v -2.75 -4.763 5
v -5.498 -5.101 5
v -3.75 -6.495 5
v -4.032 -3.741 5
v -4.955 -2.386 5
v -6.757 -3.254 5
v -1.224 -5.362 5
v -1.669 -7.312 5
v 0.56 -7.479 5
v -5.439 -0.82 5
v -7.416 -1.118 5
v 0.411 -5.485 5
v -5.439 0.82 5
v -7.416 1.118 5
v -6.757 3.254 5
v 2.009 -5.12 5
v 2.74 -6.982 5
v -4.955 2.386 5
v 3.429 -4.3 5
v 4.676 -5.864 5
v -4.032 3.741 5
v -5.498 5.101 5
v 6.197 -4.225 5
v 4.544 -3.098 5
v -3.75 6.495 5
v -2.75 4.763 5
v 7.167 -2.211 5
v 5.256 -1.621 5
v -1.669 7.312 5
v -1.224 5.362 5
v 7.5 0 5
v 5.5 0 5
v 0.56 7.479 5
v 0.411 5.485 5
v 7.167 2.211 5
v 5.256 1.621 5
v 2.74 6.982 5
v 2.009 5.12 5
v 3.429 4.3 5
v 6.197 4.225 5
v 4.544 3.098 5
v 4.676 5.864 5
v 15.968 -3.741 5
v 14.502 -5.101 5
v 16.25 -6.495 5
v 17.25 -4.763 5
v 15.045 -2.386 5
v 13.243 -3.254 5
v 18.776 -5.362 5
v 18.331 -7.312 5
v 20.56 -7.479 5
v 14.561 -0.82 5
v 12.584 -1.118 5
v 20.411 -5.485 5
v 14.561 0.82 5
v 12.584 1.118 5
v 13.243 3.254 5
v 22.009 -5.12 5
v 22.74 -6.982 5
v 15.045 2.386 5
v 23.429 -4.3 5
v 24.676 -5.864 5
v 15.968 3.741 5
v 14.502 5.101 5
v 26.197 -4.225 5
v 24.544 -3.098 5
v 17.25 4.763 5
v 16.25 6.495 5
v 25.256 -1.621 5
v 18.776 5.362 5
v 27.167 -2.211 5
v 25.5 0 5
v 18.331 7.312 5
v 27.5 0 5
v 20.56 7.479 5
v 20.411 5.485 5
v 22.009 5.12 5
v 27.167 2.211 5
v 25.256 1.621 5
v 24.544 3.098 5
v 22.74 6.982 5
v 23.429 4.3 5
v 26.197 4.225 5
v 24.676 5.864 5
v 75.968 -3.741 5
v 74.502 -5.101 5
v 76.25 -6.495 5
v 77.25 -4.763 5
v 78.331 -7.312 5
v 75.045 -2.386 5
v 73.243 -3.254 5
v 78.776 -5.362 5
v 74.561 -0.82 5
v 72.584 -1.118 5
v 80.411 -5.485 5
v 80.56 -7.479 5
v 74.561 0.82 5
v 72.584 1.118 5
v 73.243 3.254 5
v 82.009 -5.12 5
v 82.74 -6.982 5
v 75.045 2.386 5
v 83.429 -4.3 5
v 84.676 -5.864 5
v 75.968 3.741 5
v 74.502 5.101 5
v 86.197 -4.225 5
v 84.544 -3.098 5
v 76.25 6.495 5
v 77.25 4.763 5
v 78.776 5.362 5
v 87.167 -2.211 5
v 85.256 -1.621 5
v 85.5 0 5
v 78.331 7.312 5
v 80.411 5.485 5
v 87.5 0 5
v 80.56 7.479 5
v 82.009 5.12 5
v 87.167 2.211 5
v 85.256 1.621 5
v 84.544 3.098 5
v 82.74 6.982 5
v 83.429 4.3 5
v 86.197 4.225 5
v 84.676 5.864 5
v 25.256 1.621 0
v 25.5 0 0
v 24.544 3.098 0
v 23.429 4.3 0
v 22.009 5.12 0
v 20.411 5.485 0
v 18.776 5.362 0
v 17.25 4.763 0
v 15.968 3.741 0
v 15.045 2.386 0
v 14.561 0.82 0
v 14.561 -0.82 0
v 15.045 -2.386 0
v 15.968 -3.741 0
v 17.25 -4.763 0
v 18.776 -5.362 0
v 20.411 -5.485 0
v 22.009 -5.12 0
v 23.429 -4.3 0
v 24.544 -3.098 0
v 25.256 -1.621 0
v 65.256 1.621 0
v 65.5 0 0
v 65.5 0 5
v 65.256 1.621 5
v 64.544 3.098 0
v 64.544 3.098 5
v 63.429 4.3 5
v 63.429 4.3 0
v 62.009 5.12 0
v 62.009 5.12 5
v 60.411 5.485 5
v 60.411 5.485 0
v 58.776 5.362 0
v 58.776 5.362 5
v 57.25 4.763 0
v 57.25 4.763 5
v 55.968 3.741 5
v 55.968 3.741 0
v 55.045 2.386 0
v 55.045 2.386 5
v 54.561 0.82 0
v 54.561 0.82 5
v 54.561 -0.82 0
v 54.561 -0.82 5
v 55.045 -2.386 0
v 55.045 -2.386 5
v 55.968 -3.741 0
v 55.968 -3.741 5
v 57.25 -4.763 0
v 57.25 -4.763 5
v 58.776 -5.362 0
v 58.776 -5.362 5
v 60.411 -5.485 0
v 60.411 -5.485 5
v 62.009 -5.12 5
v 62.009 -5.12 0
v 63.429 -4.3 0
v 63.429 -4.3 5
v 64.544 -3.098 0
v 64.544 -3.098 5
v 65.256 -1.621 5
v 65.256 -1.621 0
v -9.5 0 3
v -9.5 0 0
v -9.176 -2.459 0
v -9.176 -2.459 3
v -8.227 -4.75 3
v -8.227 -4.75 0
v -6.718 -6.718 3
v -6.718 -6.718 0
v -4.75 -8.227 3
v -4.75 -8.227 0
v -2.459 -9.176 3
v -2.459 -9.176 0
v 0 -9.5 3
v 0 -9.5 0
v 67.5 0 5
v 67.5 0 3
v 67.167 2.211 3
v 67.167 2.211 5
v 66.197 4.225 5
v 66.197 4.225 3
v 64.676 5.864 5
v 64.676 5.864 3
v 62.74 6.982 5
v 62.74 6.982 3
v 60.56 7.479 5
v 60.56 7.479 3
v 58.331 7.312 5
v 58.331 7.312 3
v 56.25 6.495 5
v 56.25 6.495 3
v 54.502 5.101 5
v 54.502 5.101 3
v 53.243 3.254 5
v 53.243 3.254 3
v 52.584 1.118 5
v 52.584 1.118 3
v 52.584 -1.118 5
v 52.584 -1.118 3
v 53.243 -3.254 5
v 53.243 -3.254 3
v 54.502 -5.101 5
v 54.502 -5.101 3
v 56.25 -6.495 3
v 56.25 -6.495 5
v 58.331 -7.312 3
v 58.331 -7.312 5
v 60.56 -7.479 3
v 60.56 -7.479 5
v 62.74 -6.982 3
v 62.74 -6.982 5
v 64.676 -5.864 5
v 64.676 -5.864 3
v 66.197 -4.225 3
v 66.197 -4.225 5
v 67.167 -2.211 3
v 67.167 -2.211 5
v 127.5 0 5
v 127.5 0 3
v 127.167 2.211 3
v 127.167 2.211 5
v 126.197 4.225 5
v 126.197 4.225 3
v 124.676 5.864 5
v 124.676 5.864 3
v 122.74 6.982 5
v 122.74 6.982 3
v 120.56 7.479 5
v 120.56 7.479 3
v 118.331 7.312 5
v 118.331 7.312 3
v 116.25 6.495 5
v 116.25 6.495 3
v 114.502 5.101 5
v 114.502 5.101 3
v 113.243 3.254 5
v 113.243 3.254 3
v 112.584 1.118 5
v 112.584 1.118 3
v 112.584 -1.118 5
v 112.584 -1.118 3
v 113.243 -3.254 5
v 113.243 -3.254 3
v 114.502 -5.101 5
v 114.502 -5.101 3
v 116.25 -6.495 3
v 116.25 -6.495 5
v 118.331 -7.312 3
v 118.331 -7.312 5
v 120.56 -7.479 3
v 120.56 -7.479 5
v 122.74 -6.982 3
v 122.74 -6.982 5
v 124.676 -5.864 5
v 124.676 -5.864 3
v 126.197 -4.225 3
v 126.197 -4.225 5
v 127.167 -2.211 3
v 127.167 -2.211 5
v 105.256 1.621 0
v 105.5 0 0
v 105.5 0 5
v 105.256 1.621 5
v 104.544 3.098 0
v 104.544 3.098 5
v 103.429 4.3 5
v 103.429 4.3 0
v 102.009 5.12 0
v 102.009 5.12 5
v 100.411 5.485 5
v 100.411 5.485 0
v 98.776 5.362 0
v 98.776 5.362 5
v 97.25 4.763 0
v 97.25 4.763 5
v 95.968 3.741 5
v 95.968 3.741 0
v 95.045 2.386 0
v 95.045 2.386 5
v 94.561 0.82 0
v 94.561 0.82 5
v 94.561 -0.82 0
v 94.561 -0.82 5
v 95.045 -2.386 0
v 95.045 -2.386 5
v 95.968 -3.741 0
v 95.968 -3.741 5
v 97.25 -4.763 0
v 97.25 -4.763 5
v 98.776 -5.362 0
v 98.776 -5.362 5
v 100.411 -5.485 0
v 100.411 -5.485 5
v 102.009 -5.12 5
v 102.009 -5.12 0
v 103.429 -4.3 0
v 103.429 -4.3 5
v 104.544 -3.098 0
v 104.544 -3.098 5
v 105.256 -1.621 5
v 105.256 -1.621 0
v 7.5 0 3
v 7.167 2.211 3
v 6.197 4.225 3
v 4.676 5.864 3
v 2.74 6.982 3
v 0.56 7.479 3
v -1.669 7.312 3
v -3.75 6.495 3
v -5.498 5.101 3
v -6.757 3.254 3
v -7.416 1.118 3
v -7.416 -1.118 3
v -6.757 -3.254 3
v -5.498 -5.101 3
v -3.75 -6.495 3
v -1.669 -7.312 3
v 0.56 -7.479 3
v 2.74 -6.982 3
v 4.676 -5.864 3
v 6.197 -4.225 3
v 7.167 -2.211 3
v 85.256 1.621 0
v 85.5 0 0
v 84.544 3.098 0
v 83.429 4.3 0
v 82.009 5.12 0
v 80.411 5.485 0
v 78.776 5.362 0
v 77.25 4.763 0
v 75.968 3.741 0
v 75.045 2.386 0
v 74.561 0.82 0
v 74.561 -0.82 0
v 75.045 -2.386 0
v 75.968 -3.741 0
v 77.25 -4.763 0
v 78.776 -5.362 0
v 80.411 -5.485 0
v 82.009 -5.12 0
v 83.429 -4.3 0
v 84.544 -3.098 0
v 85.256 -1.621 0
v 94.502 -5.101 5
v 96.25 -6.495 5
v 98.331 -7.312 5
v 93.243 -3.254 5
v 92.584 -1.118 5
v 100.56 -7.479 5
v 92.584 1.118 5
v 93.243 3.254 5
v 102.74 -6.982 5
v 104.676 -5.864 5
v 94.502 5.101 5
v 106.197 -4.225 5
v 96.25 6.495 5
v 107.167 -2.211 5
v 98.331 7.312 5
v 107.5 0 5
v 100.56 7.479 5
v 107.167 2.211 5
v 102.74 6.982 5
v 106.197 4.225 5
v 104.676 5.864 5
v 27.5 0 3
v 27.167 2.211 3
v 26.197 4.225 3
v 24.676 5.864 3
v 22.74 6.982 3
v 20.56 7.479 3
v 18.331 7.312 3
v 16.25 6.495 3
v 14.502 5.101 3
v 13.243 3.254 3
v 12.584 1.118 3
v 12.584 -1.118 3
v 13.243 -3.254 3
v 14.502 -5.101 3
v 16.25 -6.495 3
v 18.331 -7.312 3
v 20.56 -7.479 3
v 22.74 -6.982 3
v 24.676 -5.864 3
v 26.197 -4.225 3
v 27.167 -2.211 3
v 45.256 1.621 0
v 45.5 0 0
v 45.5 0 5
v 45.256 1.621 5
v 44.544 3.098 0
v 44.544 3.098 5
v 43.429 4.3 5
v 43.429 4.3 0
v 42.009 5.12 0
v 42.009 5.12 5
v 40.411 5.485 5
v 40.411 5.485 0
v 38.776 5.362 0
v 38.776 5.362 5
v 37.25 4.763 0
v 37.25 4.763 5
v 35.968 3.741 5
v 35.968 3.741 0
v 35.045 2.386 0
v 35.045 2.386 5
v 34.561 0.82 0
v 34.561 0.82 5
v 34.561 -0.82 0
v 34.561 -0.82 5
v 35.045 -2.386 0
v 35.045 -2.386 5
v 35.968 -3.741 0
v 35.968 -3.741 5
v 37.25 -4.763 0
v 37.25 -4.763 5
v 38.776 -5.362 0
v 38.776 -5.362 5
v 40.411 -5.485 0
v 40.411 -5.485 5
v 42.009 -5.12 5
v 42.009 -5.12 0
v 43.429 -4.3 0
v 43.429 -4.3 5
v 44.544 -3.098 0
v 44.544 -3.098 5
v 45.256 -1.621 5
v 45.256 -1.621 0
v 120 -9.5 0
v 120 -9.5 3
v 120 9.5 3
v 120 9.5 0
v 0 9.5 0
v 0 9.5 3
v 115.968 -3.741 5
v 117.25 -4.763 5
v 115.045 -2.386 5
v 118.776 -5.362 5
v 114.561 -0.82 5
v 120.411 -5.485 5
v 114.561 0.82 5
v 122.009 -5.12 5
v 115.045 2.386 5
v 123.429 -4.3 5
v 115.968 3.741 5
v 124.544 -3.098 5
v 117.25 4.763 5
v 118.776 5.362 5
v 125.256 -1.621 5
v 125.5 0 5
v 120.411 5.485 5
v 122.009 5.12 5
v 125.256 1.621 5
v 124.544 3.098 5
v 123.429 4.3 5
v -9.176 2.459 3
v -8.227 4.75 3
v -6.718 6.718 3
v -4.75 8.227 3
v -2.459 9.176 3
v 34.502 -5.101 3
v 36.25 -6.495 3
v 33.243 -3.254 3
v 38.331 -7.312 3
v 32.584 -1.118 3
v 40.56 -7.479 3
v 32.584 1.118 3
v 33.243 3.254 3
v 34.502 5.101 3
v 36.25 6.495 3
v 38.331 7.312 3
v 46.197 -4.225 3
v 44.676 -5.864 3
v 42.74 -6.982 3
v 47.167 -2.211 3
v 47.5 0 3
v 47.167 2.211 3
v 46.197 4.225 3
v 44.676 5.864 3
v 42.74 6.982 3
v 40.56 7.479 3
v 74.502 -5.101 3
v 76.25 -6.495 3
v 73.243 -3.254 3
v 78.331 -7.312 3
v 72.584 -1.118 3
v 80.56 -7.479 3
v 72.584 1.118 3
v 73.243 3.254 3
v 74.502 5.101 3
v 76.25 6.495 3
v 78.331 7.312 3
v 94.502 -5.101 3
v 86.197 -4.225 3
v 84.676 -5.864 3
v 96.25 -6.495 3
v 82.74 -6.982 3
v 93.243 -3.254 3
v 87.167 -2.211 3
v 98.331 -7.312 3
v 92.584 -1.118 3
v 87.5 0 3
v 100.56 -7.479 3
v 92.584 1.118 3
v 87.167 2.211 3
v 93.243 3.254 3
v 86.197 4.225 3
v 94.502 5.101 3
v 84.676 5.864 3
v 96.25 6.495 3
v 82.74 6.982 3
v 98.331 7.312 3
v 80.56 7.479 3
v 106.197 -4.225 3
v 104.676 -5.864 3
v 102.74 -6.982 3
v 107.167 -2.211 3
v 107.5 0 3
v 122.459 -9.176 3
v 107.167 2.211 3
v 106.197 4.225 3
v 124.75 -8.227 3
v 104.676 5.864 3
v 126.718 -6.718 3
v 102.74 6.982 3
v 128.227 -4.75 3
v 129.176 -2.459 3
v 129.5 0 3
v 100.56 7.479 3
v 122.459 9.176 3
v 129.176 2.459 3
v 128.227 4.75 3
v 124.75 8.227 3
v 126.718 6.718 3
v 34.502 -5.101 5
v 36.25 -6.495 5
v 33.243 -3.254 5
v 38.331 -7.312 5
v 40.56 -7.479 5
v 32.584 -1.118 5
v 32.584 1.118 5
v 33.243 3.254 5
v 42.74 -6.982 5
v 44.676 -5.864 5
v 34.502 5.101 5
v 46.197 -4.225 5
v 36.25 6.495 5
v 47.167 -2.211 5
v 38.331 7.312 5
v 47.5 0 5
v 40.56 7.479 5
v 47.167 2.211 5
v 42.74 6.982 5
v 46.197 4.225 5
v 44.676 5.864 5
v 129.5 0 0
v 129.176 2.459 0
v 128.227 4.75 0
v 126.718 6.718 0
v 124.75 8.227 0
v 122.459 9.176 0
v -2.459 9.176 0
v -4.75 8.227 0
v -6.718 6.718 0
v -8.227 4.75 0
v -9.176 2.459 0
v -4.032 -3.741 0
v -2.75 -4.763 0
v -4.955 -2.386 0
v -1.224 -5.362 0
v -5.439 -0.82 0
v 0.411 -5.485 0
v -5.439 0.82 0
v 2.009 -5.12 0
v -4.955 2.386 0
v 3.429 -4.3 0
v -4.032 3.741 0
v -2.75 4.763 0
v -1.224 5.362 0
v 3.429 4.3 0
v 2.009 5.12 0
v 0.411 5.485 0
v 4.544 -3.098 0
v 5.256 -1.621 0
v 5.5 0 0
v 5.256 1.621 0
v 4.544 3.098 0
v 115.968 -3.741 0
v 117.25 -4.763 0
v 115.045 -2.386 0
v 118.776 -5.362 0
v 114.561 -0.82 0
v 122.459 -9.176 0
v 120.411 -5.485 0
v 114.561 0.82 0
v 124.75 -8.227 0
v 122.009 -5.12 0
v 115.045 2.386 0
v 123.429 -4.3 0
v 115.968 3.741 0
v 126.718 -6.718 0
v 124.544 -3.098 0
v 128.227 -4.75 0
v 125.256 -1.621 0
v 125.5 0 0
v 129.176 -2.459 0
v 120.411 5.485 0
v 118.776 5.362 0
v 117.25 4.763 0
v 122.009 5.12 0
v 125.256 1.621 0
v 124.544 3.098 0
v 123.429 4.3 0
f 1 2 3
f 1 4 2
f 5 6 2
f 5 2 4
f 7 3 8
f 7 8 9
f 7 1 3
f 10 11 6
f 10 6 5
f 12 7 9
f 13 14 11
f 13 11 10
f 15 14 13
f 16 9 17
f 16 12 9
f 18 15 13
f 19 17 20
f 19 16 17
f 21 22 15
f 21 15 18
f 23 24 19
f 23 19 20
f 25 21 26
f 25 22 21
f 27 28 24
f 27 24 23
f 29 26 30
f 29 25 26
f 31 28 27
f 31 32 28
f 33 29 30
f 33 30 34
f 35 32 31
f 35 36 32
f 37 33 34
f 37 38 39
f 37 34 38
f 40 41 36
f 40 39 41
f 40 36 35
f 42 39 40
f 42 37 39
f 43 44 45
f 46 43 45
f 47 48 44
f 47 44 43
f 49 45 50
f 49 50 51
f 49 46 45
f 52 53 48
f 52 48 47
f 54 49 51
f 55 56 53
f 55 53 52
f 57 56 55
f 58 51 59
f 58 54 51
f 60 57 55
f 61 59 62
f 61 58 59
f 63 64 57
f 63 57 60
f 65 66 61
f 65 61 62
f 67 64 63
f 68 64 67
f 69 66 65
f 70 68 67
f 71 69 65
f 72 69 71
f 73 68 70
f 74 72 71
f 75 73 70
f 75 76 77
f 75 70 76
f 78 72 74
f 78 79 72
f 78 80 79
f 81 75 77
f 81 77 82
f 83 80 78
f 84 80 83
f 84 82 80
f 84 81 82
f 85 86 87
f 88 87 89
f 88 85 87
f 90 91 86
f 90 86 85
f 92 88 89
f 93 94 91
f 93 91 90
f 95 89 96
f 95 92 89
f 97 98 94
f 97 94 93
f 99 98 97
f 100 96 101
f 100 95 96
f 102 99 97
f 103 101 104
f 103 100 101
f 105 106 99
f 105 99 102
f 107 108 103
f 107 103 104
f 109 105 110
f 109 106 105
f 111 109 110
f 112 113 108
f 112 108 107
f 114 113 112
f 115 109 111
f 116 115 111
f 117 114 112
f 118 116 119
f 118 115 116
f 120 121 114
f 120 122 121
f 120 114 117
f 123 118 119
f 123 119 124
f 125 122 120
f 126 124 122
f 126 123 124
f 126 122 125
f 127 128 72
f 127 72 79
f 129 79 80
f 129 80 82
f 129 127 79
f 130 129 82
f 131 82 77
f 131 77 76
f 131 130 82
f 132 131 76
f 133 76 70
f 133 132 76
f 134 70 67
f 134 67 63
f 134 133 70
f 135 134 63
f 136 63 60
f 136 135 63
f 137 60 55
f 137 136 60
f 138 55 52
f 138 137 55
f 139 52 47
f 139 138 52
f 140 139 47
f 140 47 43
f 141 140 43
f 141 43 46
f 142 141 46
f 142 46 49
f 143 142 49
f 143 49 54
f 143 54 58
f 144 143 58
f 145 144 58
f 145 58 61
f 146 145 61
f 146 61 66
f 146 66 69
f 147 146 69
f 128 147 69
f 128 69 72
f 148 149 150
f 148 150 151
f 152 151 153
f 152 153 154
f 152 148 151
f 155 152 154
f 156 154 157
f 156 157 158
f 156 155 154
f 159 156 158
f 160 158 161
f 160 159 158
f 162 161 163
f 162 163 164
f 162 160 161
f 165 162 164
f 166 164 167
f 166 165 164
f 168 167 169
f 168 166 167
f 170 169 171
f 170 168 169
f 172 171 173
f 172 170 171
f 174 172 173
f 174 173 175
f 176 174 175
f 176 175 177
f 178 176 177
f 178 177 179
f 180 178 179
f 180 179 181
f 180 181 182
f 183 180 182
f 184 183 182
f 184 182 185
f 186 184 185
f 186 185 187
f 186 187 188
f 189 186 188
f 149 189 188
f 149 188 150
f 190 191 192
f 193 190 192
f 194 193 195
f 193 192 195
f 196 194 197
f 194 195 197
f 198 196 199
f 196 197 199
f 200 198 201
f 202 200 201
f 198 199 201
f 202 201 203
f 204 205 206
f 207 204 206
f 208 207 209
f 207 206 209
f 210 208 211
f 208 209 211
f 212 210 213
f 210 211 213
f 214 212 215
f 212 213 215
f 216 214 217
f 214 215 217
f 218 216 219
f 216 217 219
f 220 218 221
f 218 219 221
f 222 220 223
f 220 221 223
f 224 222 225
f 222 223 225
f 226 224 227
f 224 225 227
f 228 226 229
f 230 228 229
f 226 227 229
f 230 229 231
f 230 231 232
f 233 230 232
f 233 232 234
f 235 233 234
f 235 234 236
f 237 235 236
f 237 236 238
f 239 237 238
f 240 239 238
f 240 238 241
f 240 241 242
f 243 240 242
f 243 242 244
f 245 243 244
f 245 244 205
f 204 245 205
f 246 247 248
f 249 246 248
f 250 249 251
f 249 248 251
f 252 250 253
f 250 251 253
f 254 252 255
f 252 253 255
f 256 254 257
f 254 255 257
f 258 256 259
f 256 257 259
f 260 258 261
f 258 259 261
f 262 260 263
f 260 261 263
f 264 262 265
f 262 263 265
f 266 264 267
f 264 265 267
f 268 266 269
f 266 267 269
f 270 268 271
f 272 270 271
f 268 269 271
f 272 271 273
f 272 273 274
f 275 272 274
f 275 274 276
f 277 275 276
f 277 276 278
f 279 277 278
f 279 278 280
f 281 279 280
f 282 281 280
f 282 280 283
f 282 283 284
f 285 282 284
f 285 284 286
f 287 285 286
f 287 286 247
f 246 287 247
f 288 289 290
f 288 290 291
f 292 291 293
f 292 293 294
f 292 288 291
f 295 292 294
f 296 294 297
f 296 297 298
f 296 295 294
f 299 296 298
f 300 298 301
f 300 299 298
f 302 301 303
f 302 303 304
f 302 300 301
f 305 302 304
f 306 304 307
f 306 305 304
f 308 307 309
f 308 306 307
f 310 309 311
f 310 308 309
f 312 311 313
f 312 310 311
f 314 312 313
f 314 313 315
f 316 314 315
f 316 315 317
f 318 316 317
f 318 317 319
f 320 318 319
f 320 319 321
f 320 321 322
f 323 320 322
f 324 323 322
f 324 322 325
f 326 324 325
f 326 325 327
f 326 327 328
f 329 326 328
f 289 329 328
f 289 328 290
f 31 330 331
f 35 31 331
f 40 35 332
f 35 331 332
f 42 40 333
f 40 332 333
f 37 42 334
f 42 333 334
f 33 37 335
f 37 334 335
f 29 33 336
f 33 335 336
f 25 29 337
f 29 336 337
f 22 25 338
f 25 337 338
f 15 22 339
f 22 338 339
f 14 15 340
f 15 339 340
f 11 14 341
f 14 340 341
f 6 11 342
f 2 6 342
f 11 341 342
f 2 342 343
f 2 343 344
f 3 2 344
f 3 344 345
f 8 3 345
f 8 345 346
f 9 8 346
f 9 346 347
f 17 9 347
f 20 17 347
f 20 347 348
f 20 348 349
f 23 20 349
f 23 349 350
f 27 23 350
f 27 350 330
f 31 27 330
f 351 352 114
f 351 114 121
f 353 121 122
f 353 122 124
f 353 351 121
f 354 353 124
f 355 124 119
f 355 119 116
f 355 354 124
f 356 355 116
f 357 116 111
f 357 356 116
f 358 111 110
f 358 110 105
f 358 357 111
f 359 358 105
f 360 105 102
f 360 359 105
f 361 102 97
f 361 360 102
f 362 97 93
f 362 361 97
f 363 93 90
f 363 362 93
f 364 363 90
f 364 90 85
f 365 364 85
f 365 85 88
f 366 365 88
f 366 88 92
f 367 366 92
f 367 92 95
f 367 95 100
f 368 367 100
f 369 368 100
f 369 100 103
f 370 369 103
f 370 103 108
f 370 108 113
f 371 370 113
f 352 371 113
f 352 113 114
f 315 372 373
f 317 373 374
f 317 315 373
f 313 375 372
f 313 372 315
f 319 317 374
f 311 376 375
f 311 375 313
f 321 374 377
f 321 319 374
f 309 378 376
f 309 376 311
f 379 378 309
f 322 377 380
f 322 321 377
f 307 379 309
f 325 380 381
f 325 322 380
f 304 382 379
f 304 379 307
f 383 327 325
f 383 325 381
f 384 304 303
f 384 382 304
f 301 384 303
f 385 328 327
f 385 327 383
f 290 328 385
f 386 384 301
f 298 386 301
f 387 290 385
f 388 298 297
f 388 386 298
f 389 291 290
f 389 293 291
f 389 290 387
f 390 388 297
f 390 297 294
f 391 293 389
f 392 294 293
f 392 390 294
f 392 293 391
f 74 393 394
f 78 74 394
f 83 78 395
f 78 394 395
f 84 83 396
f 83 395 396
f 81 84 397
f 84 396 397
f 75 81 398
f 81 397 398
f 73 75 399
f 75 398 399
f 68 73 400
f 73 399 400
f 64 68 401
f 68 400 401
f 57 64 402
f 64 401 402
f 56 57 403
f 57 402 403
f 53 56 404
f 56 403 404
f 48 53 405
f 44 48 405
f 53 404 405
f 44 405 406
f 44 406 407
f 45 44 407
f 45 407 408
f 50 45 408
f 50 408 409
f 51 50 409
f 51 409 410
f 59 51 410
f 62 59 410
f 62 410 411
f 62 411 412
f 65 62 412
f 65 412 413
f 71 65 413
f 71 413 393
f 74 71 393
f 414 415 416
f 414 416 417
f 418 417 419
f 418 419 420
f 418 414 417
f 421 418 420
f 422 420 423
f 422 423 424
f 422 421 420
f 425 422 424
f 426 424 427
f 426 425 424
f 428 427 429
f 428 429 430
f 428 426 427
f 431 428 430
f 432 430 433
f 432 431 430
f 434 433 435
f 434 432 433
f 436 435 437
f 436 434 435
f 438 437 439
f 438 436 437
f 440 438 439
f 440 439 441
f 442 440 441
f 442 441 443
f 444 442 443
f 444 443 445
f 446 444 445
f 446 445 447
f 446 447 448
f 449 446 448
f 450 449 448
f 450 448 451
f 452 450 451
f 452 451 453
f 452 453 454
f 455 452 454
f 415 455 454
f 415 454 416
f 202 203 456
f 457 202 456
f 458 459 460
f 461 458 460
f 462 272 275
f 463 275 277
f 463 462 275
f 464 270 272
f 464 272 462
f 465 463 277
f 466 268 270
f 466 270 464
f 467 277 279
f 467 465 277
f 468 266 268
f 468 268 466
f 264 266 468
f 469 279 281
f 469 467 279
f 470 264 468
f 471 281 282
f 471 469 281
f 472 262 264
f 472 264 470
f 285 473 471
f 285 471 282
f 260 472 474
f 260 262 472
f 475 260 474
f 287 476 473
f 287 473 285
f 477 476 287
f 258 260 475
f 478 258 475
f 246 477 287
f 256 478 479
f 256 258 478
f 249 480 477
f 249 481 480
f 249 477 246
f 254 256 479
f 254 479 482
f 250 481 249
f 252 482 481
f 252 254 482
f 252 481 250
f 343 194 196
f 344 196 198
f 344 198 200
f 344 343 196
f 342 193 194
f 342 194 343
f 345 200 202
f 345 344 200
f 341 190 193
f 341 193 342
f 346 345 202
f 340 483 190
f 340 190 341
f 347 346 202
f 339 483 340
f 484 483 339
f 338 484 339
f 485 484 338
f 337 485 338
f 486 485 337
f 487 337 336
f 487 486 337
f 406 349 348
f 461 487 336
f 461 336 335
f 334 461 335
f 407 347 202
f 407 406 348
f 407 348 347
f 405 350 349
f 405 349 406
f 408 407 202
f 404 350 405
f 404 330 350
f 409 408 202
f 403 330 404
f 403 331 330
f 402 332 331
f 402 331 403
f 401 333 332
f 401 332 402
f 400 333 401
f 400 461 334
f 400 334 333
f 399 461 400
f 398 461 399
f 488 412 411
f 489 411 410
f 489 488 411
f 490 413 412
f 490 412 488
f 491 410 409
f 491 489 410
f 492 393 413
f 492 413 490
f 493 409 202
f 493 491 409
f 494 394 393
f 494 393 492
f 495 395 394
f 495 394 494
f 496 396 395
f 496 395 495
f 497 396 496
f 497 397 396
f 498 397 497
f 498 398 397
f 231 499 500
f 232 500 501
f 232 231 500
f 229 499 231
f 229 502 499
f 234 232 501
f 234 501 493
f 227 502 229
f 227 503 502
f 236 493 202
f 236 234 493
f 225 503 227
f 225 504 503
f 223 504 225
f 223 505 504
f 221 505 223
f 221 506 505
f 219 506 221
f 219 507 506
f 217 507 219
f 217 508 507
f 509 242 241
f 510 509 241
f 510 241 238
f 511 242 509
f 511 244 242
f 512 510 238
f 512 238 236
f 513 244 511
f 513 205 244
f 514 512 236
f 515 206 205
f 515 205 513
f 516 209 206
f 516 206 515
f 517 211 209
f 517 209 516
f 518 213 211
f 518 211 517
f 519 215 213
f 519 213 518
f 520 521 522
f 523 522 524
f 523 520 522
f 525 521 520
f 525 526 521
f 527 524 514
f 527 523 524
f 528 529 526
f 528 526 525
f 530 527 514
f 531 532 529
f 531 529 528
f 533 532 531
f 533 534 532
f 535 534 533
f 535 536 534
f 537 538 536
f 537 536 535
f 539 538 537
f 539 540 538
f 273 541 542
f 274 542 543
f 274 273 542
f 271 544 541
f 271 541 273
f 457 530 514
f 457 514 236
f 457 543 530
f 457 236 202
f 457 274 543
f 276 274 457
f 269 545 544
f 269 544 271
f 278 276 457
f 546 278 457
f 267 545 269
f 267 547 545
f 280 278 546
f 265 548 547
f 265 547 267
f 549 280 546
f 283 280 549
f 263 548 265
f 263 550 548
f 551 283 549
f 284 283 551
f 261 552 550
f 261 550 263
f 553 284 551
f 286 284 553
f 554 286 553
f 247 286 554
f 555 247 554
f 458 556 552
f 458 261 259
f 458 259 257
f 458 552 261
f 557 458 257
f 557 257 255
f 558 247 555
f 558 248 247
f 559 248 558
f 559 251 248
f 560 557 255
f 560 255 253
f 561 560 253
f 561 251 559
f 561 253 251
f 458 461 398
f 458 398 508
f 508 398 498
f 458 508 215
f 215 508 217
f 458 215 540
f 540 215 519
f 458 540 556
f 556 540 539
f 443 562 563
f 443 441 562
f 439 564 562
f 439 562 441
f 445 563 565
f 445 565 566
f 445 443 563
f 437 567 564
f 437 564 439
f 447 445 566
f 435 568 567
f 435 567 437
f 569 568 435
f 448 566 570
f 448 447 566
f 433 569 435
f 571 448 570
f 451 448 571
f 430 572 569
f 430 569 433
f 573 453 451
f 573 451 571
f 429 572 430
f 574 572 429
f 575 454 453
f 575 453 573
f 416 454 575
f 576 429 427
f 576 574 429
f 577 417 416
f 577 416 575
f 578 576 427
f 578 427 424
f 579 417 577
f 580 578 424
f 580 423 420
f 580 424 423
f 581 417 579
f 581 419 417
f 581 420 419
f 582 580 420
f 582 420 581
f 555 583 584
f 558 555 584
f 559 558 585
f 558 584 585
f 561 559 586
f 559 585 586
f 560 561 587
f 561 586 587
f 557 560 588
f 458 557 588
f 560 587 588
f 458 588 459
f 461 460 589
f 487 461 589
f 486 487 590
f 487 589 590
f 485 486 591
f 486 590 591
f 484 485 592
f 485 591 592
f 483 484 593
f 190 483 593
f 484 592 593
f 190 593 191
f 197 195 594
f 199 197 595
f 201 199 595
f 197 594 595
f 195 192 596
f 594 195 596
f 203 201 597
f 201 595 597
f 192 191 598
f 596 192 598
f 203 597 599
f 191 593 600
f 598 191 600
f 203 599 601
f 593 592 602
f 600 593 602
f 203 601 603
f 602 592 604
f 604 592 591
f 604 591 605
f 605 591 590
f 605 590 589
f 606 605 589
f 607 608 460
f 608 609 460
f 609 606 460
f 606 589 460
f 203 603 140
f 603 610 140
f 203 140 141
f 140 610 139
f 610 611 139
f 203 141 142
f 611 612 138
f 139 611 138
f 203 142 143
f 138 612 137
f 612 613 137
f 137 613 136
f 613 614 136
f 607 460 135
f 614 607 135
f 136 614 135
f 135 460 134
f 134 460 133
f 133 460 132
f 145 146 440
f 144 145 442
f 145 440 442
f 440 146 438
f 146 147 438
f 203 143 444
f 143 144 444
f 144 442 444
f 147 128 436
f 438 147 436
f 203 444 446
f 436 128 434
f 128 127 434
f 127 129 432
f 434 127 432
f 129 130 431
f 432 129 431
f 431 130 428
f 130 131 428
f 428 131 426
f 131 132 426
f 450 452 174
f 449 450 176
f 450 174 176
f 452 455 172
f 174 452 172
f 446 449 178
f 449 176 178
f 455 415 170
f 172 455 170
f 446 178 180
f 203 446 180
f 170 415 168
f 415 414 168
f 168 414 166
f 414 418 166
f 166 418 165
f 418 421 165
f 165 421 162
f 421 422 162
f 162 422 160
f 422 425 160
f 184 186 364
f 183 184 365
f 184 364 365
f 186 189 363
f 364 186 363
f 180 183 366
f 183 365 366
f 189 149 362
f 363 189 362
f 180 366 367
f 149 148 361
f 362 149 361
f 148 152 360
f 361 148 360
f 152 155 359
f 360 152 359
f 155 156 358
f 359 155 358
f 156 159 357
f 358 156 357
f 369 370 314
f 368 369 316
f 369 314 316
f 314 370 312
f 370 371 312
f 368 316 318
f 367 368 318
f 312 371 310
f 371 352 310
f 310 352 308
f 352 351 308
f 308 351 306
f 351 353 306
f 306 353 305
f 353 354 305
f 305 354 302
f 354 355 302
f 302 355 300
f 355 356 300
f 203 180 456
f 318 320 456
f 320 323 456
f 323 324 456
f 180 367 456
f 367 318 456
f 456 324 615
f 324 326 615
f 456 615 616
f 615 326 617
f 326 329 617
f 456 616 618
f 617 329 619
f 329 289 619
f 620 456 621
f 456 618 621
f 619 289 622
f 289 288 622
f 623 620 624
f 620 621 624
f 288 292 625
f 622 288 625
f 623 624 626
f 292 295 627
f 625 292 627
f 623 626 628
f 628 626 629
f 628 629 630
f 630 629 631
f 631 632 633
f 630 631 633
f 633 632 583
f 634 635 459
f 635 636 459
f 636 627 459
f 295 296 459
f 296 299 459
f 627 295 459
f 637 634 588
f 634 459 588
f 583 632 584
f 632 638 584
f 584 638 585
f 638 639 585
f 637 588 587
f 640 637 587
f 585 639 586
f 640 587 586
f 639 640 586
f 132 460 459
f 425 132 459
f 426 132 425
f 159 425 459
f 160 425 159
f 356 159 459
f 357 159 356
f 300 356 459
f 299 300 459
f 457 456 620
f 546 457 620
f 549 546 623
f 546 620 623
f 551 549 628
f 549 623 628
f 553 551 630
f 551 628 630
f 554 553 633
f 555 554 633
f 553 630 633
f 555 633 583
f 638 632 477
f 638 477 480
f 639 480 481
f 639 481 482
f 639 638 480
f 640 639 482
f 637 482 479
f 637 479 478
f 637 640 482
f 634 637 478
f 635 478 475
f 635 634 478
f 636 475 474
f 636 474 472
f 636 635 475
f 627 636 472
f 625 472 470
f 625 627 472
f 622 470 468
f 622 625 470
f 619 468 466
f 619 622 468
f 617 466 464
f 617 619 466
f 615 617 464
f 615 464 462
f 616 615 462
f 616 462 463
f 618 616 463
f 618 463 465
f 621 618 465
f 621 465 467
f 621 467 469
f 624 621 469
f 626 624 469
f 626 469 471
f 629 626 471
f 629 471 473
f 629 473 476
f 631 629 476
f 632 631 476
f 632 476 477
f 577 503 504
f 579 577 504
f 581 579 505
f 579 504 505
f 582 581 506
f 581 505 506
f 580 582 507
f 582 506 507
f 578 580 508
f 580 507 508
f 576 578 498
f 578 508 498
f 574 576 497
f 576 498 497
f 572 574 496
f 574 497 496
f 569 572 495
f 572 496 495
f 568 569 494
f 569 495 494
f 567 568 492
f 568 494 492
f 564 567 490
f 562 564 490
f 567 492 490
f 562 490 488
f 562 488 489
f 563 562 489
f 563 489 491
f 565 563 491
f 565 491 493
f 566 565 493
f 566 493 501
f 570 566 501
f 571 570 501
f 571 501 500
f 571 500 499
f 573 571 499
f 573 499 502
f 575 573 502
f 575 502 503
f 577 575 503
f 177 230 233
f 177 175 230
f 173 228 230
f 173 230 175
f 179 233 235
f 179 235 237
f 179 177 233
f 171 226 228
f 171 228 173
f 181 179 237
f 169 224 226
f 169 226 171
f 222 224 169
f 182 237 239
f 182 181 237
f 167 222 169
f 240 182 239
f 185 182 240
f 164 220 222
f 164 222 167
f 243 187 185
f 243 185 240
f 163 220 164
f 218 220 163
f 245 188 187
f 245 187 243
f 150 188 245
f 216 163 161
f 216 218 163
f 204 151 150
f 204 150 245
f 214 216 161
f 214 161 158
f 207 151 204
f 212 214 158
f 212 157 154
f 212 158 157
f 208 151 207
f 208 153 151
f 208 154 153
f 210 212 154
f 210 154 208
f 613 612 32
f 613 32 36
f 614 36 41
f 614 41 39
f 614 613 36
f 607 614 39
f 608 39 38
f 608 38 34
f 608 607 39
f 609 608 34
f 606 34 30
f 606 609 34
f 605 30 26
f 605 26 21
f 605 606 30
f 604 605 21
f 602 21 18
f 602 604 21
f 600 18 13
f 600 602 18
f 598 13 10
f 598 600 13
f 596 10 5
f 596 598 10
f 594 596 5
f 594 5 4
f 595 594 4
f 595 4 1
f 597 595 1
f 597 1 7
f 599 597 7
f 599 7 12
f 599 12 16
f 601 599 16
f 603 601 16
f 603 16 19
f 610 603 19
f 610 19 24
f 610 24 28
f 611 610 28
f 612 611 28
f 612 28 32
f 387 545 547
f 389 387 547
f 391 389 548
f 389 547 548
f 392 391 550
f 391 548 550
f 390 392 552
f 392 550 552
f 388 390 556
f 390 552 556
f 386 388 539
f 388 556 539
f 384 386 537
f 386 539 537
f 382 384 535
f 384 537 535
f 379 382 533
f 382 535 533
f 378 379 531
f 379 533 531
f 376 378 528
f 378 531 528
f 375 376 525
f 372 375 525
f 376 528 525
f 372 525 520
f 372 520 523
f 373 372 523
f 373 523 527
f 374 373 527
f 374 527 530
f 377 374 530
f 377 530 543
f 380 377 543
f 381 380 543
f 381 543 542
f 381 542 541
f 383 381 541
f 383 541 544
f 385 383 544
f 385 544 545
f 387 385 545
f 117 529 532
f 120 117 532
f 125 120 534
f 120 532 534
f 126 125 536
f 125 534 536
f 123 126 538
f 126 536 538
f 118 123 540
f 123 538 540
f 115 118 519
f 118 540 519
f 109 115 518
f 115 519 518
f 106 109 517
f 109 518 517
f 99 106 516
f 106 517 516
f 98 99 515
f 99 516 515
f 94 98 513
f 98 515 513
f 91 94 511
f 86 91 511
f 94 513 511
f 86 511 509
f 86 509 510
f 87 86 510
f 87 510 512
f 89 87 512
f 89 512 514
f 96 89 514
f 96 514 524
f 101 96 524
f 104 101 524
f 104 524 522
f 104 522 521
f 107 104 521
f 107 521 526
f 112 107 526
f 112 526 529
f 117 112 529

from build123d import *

# Parameters (mm, degrees)
F2_R     = 7.5
F2_R_2   = 5.5
F3_DEPTH = 3
F4_DEPTH = 5


# Not quite as in the source:
# - a feature names something its author has since deleted; it is built from what else it names


with BuildPart() as f3:
    # F2 (on Top) → F3 (new body)
    with BuildSketch(Plane.XY):
        with BuildLine():
            Line((120, 9.5), (0, 9.5))
            ThreePointArc((0, 9.5), (-6.7175144213, 6.7175144213), (-9.5, 0))
            ThreePointArc((-9.5, 0), (-6.7175144213, -6.7175144213), (0, -9.5))
            Line((0, -9.5), (120, -9.5))
            ThreePointArc((120, -9.5), (126.7175144213, -6.7175144213), (129.5, 0))
            ThreePointArc((129.5, 0), (126.7175144213, 6.7175144213), (120, 9.5))
        make_face()
        Circle(F2_R, mode=Mode.SUBTRACT)
        with Locations((20, 0)):
            Circle(F2_R, mode=Mode.SUBTRACT)
        with Locations((40, 0)):
            Circle(F2_R, mode=Mode.SUBTRACT)
        with Locations((60, 0)):
            Circle(F2_R, mode=Mode.SUBTRACT)
        with Locations((80, 0)):
            Circle(F2_R, mode=Mode.SUBTRACT)
        with Locations((100, 0)):
            Circle(F2_R, mode=Mode.SUBTRACT)
        with Locations((120, 0)):
            Circle(F2_R, mode=Mode.SUBTRACT)
        Circle(F2_R)
        Circle(F2_R_2, mode=Mode.SUBTRACT)
        with Locations((20, 0)):
            Circle(F2_R)
        with Locations((20, 0)):
            Circle(F2_R_2, mode=Mode.SUBTRACT)
        with Locations((40, 0)):
            Circle(F2_R)
        with Locations((40, 0)):
            Circle(F2_R_2, mode=Mode.SUBTRACT)
        with Locations((60, 0)):
            Circle(F2_R)
        with Locations((60, 0)):
            Circle(F2_R_2, mode=Mode.SUBTRACT)
        with Locations((80, 0)):
            Circle(F2_R)
        with Locations((80, 0)):
            Circle(F2_R_2, mode=Mode.SUBTRACT)
        with Locations((100, 0)):
            Circle(F2_R)
        with Locations((100, 0)):
            Circle(F2_R_2, mode=Mode.SUBTRACT)
        with Locations((120, 0)):
            Circle(F2_R)
        with Locations((120, 0)):
            Circle(F2_R_2, mode=Mode.SUBTRACT)
    extrude(amount=F3_DEPTH)

    # F2 (on Top) → F4 (join)
    with BuildSketch(Plane.XY):
        Circle(F2_R)
        Circle(F2_R_2, mode=Mode.SUBTRACT)
        with Locations((20, 0)):
            Circle(F2_R)
        with Locations((20, 0)):
            Circle(F2_R_2, mode=Mode.SUBTRACT)
        with Locations((40, 0)):
            Circle(F2_R)
        with Locations((40, 0)):
            Circle(F2_R_2, mode=Mode.SUBTRACT)
        with Locations((60, 0)):
            Circle(F2_R)
        with Locations((60, 0)):
            Circle(F2_R_2, mode=Mode.SUBTRACT)
        with Locations((80, 0)):
            Circle(F2_R)
        with Locations((80, 0)):
            Circle(F2_R_2, mode=Mode.SUBTRACT)
        with Locations((100, 0)):
            Circle(F2_R)
        with Locations((100, 0)):
            Circle(F2_R_2, mode=Mode.SUBTRACT)
        with Locations((120, 0)):
            Circle(F2_R)
        with Locations((120, 0)):
            Circle(F2_R_2, mode=Mode.SUBTRACT)
    extrude(amount=F4_DEPTH)


solid = f3.part
